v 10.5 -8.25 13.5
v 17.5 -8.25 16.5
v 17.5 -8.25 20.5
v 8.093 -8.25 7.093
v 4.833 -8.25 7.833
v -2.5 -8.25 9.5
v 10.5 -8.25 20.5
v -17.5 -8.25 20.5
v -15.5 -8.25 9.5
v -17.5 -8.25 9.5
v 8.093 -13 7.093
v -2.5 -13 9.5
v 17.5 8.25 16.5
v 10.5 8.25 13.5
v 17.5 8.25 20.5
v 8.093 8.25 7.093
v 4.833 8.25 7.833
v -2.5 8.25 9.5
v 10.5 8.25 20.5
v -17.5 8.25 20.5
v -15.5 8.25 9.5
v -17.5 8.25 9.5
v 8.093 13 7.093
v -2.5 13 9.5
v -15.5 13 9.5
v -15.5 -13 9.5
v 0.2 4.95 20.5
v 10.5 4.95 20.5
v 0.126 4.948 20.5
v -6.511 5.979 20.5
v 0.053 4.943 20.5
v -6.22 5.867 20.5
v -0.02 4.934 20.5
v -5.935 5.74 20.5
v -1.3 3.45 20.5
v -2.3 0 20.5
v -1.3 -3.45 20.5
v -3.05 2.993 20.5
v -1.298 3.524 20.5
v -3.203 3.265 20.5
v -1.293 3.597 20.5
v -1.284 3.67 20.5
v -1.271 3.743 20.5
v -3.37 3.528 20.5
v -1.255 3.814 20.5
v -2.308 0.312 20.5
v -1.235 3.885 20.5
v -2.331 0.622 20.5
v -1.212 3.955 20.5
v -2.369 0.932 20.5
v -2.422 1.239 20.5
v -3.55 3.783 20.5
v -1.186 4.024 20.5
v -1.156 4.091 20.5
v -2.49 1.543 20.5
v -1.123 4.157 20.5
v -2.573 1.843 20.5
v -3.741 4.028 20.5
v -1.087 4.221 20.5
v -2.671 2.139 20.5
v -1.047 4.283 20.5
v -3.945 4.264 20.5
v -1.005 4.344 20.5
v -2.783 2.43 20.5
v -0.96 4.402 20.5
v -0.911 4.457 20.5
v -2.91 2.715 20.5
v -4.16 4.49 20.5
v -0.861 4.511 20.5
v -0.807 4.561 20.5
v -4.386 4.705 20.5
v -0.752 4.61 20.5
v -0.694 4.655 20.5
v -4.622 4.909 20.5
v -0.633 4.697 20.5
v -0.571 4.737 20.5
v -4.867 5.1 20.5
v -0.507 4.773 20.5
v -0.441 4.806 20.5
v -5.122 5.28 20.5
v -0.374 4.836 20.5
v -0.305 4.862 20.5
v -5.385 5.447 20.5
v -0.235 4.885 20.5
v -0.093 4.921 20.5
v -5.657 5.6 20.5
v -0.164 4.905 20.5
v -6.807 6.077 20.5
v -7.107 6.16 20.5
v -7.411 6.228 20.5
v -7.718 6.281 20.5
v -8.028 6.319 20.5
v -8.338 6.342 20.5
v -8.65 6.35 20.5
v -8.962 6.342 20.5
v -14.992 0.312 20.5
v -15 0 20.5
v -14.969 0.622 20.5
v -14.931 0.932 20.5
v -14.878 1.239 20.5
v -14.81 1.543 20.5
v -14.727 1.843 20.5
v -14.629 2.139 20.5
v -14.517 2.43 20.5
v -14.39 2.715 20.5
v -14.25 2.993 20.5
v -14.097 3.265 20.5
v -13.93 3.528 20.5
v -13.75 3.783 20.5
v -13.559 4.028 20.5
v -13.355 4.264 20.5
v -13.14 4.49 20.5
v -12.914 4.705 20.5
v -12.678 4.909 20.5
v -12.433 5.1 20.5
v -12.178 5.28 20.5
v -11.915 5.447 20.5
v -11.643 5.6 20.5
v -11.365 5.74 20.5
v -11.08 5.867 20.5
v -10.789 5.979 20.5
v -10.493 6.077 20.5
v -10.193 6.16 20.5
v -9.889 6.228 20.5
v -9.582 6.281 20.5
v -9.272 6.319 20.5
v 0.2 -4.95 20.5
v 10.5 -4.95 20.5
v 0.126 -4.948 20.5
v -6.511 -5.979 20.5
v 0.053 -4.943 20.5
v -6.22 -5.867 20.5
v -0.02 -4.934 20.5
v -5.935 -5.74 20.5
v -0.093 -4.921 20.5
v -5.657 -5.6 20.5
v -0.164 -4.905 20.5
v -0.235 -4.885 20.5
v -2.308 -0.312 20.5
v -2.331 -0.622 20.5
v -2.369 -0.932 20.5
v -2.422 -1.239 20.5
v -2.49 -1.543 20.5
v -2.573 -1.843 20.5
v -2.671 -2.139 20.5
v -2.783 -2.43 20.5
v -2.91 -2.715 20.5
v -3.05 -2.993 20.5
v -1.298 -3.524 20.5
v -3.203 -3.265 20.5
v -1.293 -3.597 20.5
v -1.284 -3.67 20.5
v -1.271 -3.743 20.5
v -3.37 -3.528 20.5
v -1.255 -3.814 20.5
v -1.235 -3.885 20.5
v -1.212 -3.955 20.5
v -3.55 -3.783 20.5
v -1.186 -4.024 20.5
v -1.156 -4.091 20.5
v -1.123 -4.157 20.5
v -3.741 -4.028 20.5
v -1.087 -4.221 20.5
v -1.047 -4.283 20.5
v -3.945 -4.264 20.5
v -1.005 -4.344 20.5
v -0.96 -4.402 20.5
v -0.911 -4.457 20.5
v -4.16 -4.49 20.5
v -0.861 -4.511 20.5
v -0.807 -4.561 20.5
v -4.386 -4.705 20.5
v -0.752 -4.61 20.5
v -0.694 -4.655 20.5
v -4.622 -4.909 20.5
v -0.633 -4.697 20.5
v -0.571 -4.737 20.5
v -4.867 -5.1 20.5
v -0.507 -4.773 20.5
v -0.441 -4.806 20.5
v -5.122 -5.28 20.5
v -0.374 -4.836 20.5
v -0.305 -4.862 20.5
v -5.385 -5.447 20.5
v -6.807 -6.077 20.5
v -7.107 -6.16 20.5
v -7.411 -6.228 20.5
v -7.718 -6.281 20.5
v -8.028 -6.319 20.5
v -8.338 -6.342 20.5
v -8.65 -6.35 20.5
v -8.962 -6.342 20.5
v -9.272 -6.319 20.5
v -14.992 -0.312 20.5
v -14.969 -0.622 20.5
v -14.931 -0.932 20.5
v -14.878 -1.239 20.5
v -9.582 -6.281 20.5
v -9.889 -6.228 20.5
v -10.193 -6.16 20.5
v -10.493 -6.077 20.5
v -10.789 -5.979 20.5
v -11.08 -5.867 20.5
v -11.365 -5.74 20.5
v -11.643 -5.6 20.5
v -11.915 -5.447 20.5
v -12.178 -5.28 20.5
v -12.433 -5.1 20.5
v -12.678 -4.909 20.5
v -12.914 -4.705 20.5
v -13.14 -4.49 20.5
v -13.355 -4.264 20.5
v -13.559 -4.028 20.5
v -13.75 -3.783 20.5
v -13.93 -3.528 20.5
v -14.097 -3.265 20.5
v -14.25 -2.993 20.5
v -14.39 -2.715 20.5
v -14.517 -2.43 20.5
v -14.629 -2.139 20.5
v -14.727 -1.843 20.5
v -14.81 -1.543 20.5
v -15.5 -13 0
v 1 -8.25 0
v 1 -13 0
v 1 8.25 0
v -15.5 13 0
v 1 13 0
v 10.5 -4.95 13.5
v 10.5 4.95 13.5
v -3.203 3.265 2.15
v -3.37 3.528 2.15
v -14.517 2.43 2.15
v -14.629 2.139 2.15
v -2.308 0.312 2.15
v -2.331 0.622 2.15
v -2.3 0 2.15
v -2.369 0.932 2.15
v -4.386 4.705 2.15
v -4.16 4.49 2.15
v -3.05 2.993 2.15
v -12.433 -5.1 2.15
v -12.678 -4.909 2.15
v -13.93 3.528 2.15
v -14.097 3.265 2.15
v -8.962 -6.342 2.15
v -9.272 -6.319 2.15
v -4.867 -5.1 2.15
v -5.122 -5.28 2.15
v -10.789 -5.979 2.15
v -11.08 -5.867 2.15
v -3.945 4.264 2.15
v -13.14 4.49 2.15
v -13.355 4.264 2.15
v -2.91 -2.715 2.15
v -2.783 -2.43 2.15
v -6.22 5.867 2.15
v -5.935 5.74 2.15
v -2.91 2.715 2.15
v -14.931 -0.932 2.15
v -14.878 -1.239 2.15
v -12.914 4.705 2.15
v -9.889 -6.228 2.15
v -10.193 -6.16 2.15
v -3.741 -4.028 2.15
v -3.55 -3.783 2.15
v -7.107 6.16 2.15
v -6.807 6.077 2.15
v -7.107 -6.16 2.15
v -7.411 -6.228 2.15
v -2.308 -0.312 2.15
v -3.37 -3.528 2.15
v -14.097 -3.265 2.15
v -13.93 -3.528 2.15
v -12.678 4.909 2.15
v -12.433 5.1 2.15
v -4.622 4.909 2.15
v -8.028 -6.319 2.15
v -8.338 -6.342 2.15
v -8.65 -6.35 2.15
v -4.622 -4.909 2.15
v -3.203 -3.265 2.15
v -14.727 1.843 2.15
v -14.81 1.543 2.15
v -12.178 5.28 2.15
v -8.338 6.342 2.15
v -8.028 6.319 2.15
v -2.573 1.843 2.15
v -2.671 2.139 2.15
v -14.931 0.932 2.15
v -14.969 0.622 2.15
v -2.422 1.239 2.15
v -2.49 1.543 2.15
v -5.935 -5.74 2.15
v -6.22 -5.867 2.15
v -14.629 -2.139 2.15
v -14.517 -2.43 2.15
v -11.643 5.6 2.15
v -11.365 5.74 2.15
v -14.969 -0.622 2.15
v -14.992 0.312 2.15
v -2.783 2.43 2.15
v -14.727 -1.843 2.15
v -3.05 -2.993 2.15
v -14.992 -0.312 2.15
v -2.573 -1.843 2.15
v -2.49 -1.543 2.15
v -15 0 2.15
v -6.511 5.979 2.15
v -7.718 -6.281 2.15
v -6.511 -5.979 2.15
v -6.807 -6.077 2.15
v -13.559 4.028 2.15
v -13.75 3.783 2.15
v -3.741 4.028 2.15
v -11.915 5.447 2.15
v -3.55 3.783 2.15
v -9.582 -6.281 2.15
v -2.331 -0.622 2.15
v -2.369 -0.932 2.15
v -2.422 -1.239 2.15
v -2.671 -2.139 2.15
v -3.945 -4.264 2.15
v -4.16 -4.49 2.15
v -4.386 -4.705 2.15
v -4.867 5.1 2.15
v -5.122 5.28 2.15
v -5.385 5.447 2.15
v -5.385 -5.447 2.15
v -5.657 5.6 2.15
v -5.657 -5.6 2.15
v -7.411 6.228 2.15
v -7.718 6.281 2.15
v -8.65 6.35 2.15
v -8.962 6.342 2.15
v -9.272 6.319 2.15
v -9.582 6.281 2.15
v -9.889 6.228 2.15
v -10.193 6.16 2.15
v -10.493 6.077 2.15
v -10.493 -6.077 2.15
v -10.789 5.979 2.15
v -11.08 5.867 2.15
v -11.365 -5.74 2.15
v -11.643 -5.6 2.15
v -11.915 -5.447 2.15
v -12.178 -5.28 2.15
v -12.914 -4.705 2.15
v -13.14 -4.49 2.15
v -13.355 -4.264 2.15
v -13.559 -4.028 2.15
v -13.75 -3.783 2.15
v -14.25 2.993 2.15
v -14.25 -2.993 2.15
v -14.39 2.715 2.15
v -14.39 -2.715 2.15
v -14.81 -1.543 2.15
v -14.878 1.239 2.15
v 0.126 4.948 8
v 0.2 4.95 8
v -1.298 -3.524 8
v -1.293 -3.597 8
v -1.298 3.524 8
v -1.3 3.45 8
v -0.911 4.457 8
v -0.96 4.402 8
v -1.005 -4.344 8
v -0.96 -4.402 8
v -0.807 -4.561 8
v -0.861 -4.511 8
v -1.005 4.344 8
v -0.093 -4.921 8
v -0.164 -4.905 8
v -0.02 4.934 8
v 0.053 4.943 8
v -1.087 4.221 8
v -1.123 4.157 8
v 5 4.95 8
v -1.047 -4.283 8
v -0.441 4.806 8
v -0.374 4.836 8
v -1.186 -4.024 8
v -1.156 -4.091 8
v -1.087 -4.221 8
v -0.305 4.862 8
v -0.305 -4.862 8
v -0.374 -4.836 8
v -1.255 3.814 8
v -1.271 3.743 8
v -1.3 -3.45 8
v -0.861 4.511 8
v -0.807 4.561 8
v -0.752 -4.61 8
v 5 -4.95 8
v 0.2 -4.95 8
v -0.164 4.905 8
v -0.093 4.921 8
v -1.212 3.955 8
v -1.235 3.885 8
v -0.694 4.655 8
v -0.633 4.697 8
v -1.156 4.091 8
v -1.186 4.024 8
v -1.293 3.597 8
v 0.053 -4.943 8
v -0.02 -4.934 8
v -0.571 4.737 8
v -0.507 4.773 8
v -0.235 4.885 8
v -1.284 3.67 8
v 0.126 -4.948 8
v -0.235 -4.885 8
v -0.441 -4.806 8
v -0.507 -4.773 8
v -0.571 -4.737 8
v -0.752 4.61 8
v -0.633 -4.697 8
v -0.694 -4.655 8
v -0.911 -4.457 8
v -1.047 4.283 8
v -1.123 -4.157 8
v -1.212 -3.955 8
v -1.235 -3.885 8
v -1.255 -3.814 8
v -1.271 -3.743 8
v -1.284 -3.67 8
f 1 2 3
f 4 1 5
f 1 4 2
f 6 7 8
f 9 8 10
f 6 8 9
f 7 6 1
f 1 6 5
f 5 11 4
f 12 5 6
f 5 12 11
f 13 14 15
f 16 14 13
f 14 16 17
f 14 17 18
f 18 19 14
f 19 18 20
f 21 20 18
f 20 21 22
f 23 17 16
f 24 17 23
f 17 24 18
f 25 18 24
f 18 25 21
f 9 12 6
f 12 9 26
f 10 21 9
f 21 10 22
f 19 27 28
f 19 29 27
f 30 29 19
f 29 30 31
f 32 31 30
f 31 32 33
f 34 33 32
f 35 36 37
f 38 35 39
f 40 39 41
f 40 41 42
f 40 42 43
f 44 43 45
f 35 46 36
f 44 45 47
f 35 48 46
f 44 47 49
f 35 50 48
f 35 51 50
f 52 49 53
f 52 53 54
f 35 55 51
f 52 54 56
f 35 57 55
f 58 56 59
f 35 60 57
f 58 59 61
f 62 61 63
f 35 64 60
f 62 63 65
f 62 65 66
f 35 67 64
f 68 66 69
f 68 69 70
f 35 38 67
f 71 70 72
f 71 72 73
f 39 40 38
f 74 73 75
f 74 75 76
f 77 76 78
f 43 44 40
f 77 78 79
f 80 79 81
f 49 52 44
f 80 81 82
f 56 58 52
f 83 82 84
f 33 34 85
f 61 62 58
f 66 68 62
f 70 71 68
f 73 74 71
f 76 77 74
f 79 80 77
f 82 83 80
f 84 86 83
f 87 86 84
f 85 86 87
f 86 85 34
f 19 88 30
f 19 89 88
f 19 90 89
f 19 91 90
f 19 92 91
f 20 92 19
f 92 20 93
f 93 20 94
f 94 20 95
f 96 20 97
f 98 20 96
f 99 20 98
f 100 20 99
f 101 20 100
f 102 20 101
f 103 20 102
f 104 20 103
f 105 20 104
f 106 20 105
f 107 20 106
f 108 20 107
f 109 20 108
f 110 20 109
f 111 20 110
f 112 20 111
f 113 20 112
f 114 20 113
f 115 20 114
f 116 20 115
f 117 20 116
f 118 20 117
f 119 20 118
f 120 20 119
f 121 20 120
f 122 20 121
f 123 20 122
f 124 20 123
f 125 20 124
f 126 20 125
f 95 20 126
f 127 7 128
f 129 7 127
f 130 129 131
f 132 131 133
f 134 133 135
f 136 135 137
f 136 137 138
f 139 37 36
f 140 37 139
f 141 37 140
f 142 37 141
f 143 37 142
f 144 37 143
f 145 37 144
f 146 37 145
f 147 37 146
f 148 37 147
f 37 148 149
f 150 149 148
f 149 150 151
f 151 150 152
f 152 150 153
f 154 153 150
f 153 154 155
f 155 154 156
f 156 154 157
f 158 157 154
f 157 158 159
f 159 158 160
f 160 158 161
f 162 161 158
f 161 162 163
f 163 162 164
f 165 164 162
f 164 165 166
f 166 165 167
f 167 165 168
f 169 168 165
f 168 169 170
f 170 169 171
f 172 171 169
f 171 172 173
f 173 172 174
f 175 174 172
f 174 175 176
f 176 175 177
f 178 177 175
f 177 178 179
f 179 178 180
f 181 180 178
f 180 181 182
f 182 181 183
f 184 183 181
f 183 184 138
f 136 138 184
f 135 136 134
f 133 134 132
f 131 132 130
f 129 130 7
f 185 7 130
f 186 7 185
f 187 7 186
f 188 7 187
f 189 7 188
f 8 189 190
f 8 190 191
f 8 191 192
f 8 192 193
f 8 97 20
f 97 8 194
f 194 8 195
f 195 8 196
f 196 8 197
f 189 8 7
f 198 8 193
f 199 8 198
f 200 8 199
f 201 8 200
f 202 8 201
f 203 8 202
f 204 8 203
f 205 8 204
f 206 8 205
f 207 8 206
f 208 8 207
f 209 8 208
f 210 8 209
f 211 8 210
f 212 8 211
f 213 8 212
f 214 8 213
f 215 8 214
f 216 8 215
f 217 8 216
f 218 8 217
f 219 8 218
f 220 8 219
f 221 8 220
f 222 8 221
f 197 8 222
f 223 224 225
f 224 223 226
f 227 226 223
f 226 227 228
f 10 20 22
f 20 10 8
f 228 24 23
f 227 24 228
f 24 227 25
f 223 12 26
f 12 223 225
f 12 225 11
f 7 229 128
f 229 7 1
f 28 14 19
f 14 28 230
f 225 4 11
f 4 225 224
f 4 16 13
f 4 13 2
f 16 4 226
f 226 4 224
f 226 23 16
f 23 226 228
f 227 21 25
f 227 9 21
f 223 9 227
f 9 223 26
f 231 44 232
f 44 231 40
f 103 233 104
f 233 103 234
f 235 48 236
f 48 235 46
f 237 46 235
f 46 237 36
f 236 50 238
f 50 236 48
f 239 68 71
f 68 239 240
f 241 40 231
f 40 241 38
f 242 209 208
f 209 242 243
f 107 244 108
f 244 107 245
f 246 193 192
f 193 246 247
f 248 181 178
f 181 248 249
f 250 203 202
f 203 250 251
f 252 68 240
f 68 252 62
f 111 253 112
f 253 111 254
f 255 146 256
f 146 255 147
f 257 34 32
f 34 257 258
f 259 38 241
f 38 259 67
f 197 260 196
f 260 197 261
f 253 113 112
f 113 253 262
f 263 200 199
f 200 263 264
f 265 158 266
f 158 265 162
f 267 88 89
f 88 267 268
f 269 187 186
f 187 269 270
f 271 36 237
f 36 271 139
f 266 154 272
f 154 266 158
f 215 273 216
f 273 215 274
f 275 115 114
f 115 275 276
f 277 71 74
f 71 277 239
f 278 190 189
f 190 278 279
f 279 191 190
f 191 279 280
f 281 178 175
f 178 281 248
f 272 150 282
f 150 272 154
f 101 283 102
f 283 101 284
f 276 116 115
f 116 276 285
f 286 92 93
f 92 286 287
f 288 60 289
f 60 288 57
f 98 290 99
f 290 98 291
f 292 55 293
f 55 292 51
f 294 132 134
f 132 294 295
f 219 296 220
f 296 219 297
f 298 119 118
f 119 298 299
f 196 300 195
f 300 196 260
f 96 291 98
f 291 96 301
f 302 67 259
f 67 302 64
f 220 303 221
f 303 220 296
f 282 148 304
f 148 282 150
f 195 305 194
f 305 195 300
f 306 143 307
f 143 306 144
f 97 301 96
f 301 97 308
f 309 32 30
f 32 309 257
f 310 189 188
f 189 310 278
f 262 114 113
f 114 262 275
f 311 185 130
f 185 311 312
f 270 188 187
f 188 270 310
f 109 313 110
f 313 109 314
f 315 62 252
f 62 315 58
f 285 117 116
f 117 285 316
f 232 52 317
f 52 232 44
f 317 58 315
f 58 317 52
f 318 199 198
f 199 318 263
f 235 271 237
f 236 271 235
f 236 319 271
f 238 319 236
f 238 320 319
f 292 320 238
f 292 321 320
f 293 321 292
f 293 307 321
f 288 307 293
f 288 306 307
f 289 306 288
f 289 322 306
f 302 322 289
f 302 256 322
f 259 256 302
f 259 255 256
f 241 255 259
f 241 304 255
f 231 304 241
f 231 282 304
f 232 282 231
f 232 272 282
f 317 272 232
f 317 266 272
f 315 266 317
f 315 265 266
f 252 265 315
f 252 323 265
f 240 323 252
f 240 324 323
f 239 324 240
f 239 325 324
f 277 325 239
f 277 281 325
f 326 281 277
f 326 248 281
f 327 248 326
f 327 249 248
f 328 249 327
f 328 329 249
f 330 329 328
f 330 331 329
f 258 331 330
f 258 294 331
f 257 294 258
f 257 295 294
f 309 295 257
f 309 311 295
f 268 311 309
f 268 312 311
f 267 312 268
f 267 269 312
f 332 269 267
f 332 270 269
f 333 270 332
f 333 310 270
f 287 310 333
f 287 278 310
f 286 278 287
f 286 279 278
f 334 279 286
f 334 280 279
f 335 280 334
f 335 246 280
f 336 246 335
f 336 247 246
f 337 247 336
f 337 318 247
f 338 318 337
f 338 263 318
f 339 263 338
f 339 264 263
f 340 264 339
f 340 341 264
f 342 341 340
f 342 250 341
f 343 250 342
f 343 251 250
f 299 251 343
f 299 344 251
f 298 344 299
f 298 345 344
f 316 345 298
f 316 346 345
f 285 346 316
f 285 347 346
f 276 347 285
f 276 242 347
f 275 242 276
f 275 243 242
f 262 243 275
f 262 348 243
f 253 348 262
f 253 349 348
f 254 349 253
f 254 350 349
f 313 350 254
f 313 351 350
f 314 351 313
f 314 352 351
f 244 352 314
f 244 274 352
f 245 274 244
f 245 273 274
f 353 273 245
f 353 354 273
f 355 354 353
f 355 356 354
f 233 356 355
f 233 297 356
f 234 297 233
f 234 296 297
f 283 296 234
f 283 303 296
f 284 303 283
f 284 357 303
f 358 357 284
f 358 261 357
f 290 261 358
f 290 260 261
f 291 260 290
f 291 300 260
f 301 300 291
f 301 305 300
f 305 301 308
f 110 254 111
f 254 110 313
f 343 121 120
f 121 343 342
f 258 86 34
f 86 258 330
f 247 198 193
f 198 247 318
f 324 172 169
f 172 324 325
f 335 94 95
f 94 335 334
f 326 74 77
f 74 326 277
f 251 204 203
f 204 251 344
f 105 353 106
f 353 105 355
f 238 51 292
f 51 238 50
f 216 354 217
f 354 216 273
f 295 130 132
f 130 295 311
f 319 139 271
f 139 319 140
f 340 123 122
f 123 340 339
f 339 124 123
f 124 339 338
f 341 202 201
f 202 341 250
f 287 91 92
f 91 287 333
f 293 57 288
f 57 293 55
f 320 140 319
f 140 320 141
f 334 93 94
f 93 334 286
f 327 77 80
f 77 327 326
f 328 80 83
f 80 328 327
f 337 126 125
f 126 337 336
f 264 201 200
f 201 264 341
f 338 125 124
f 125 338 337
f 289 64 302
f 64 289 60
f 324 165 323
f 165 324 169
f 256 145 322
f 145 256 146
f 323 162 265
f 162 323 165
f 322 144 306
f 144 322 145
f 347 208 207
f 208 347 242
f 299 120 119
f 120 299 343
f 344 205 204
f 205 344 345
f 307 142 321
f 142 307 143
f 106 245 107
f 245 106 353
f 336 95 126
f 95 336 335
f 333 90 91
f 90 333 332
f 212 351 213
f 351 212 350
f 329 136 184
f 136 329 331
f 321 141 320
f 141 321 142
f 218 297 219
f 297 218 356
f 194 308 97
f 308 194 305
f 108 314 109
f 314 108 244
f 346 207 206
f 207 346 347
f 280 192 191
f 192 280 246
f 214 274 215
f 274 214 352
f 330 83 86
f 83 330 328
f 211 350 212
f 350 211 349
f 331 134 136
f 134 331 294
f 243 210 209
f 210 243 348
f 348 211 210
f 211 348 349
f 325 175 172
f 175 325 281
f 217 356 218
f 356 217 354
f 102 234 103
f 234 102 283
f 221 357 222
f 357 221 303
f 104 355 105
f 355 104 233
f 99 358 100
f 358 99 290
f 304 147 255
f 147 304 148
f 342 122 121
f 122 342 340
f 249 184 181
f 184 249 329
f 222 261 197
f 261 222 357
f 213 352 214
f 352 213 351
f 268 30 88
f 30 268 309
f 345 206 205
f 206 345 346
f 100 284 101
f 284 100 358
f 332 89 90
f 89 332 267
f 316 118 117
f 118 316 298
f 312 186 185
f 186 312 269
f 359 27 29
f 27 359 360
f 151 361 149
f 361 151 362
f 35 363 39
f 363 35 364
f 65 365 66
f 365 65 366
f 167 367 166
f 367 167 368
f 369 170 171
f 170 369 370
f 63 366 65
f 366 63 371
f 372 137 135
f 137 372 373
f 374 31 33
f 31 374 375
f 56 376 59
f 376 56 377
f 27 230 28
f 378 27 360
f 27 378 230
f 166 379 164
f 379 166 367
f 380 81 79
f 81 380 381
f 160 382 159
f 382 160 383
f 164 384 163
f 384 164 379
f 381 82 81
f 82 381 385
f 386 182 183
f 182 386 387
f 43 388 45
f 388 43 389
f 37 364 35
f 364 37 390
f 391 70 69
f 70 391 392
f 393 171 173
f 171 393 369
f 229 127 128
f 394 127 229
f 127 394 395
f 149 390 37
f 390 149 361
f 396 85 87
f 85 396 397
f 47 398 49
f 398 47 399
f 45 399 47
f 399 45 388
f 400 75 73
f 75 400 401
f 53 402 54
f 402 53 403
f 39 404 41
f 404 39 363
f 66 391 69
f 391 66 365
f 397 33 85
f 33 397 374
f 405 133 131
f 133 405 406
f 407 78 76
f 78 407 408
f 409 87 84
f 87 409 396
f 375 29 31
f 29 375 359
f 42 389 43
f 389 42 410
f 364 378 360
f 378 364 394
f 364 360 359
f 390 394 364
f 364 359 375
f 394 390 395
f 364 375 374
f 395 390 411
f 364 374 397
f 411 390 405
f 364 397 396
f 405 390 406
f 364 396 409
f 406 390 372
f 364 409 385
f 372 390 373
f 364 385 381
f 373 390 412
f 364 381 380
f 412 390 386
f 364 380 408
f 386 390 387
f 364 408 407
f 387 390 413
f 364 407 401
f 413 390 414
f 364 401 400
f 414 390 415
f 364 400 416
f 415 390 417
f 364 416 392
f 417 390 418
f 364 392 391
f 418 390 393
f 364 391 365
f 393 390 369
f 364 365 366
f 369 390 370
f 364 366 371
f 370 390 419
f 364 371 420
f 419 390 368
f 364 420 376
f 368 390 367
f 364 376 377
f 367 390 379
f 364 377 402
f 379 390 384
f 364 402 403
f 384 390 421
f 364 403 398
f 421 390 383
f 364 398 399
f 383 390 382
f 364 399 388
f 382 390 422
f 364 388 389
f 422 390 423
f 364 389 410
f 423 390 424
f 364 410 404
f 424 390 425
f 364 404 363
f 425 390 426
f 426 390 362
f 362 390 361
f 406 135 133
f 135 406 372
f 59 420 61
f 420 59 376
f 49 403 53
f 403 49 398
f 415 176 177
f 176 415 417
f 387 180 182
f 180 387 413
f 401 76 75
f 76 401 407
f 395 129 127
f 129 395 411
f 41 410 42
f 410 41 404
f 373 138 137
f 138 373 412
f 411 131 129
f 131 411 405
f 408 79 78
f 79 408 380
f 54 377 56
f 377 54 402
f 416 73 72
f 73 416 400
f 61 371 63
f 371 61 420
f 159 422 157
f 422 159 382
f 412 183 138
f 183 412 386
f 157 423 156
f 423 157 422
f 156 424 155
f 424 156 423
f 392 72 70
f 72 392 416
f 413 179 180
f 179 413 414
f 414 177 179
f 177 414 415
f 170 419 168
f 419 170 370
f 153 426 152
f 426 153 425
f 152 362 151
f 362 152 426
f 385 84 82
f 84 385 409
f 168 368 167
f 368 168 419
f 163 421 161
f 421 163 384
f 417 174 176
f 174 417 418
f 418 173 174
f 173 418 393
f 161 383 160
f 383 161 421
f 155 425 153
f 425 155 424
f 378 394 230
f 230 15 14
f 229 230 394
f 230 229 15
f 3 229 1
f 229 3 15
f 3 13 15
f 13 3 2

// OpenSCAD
/**
 * Adapter that holds 1.75" (44.45 mm) 12 gauge mini shells in a Mossberg 12 gauge
 * shotgun. Compatible with the commercial OPSol Mini-Clip fit. All dimensions are in
 * millimeters.
 *
 * Fit-critical: every dimension below is tuned to the receiver and the shell, so
 * change them only with a test print. Print in flexible filament (TPU).
 */

/* [Overall Dimensions] */
// Adapter width along the barrel (X)
Width = 35;

// Adapter depth across the receiver (Y)
Depth = 26;

// Adapter height (Z)
Height = 20.5;

/* [Rear Cutout] */
// Height of the notch across the rear
Rear_Cutout_Height = 9.5;

// Depth of the notch into the rear face
Rear_Cutout_Depth = 2;

/* [Front Cutout] */
// Depth of the square notch across the front
Front_Cutout_Depth = 7;

// Angle of the sloped front cut from vertical
Front_Cutout_Angle = 45; // [15:5:75]

// Distance below the base where the sloped front cut starts
Front_Cutout_Drop = 4;

/* [Side Relief] */
// Depth of the relief cut into each side of the top
Side_Relief_Depth = 4.75;

// Position along X where the side slope starts
Side_Slope_Start = -2.5;

// Rise of the side slope over its run
Side_Slope_Rise = 2.5;

// Run of the side slope over its rise
Side_Slope_Run = 11;

/* [Bore] */
// Diameter of the shell bore (12.7 for 1/2")
Bore_Diameter = 12.7;

// Depth of the shell bore
Bore_Depth = 18.35;

// Distance from the rear face to the bore edge along X
Bore_Setback = 2.5;

/* [Slot] */
// Width of the slot (Y)
Slot_Width = 9.9;

// Depth of the slot
Slot_Depth = 12.5;

// Gap between the bore and the slot along X
Slot_Gap = 1;

// Corner radius of the slot ahead of the bore
Slot_Corner_Radius = 1.5;

/* [Hidden] */
$fn = 128;

assert(2 * Side_Relief_Depth < Depth, "Side_Relief_Depth must be less than half of Depth");
assert(Bore_Setback + Bore_Diameter + Slot_Gap < Width, "Bore_Setback + Bore_Diameter + Slot_Gap must be less than Width");
assert(Bore_Depth < Height, "Bore_Depth must be less than Height");
assert(Rear_Cutout_Height < Height, "Rear_Cutout_Height must be less than Height");

module RoundedCube(x, y, z, r) {
  hull() {
    translate([r, r, 0]) cylinder(r=r, h=z);
    translate([x - r, r, 0]) cylinder(r=r, h=z);
    translate([r, y - r, 0]) cylinder(r=r, h=z);
    translate([x - r, y - r, 0]) cylinder(r=r, h=z);
  }
}

module Body() {
  translate([0, 0, Height / 2])
    cube([Width, Depth, Height], center=true);
}

module FrontCutout() {
  x = Front_Cutout_Depth + 1;
  y = Depth + 2;
  z = Height + 1;
  translate([(Width / 2) - Front_Cutout_Depth, -y / 2, 0])
    cube([x, y , z]);
}

module FrontAngledCutout() {
  x = Height + 1;
  y = Depth + 1;
  z = 2 * Height + Front_Cutout_Drop + 1;

  translate([(Width / 2) - Height, 0, -Front_Cutout_Drop])
    rotate([0, Front_Cutout_Angle, 0])
    translate([x / 2, 0, z / 2])
    cube([x, y, z], center=true);
}

module RearCutout() {
  x = Rear_Cutout_Depth + 1;
  y = Depth + 1;
  z = Rear_Cutout_Height + 1;

  translate([-(Width / 2) - 1, -y / 2, -1])
    cube([x, y, z]);
}

module TopSideAngledCutouts() {
  a = atan(Side_Slope_Rise / Side_Slope_Run);
  x = Width;
  y = Depth + 1;
  z = Height;

  translate([Side_Slope_Start, 0, Rear_Cutout_Height]) {
    translate([0, -y - (Depth / 2) + Side_Relief_Depth, 0]) rotate([0, a, 0]) cube([x, y, z]);
    translate([0, (Depth / 2) - Side_Relief_Depth, 0]) rotate([0, a, 0]) cube([x, y, z]);
  }
}

module TopSideCutouts() {
  x = Width + 1;
  y = Side_Relief_Depth + 1;
  z = Height - Rear_Cutout_Height + 1;

  TopSideAngledCutouts();
  translate([-(Width + 1) / 2, 0, Rear_Cutout_Height]) {
    translate([0, -(Depth / 2) - 1, 0]) cube([x, y, z]);
    translate([0, (Depth / 2) - Side_Relief_Depth, 0]) cube([x, y, z]);
  }
}

module TopCylindricalCutout() {
  dx = ((Bore_Diameter - Width) / 2) + Bore_Setback;
  dz = Height - Bore_Depth;
  translate([dx, 0, dz])
    cylinder(d=Bore_Diameter, h=Height);
}

module TopRectangularCutout() {
  x = Width;
  dx = -Width / 2 + Bore_Setback + Bore_Diameter + Slot_Gap;

  translate([dx, -Slot_Width / 2, Height - Slot_Depth])
    RoundedCube(x, Slot_Width, Slot_Depth + 1, Slot_Corner_Radius);
}

module FrontAngledLip() {
  y = Depth - 2 * Side_Relief_Depth;
  t = tan(Front_Cutout_Angle);
  outer_base = Front_Cutout_Drop * t;

  translate([-Height + Width / 2, 0, 0])
    rotate([90, 0, 0])
    linear_extrude(height=y, center=true)
    intersection() {
      square([Height, Height]);
      polygon([
        [outer_base - Front_Cutout_Drop, 0],
        [outer_base, 0],
        [outer_base + Height * t, Height],
        [outer_base + Height * t - Front_Cutout_Drop, Height],
      ]);
    }
}

module MiniClip() {
  difference() {
    Body();
    FrontCutout();
    FrontAngledCutout();
    RearCutout();
    TopSideCutouts();
    TopCylindricalCutout();
    TopRectangularCutout();
  }

  FrontAngledLip();
}

MiniClip();
